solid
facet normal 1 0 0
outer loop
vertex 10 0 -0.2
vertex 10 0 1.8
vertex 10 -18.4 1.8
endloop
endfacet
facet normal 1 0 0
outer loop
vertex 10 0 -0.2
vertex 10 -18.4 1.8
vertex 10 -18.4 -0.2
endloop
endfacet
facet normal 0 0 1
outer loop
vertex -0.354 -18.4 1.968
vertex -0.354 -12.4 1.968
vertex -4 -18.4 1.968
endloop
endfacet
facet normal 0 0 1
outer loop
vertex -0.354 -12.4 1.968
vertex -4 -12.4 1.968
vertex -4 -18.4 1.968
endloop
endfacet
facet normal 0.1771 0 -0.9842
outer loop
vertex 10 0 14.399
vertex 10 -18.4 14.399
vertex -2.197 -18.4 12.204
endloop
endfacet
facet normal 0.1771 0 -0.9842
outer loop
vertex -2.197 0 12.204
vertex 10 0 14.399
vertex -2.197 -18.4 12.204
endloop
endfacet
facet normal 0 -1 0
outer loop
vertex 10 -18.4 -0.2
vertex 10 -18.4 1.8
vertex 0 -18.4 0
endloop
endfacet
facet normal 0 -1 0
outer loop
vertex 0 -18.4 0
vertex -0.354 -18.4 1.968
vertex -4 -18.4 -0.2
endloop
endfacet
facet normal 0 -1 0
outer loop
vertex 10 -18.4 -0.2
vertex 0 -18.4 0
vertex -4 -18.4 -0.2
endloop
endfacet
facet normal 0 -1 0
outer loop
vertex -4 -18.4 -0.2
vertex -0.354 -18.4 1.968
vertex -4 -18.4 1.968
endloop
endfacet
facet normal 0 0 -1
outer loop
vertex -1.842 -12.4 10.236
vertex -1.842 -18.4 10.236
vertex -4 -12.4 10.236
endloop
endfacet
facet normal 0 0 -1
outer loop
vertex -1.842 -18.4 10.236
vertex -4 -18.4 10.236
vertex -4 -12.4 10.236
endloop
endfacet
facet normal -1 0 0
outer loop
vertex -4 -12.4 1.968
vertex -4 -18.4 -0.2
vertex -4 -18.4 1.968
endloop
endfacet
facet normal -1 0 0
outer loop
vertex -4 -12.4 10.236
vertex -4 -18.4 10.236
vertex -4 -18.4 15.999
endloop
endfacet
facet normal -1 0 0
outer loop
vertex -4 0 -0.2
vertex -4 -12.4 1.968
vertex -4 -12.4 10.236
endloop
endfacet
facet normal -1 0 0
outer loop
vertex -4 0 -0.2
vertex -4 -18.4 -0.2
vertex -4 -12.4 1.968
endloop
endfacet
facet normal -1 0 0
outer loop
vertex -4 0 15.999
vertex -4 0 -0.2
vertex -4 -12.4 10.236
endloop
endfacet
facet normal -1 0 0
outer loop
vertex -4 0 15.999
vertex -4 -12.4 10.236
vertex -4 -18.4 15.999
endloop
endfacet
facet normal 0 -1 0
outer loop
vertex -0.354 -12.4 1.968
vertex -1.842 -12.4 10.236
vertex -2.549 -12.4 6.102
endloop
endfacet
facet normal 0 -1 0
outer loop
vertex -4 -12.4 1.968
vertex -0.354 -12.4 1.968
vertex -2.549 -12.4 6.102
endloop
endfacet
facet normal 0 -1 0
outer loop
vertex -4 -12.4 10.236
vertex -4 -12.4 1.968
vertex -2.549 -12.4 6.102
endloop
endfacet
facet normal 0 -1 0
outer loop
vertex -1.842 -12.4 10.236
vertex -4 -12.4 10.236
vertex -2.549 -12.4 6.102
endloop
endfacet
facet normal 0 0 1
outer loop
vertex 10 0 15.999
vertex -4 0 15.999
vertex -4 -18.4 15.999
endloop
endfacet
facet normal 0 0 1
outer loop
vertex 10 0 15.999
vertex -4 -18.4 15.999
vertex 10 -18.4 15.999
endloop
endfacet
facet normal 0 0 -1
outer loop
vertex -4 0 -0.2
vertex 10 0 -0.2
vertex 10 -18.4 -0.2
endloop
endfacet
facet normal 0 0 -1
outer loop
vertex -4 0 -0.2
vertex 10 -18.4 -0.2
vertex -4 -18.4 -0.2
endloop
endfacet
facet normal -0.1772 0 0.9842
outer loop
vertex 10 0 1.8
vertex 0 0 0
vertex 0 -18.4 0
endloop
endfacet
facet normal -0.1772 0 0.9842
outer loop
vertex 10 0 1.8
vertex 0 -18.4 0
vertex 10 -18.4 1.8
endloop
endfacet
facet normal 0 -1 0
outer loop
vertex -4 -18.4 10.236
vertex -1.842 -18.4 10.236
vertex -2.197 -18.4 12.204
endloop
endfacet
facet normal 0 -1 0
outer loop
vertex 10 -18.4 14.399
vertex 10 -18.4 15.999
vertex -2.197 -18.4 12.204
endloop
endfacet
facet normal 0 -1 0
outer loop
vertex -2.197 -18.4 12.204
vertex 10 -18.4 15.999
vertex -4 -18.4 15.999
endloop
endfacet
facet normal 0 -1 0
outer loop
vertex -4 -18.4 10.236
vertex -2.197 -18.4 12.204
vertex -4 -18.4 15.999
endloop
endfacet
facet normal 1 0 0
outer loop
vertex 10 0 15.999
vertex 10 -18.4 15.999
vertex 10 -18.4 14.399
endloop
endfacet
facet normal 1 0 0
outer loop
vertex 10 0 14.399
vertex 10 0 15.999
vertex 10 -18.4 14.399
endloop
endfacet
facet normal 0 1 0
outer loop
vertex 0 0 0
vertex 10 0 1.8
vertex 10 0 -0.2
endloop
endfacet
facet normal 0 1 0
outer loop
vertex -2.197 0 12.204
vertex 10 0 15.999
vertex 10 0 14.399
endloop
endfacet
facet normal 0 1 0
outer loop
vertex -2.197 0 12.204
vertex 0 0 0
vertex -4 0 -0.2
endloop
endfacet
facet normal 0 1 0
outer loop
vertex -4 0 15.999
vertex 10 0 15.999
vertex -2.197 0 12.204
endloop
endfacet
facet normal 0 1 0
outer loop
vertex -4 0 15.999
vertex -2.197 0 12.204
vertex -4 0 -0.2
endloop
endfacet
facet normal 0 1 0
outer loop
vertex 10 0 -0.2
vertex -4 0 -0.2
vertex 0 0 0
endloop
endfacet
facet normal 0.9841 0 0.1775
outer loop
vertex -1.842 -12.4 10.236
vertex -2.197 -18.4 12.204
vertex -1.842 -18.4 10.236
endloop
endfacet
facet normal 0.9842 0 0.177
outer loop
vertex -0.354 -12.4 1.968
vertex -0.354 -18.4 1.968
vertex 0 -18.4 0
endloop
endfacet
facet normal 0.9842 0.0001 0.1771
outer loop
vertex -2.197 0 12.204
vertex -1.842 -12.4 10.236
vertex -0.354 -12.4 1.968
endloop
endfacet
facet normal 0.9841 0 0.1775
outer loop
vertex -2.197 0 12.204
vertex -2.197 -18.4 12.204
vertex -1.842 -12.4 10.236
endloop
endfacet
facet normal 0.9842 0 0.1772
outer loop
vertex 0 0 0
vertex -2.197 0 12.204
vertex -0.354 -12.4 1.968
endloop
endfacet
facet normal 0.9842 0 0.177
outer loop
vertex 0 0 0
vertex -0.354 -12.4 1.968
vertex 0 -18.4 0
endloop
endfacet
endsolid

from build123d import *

# Parameters (mm, degrees)
BASE_DEPTH = 18.4


with BuildPart() as part:
    # Croquis17 → BASE (new body)
    with BuildSketch(Plane(origin=(0, 0, 0), x_dir=(-1, 0, 0), z_dir=(0, 1, 0))):
        Polygon((0, 0), (-10, 1.8), (-10, -0.2), (4, -0.2), (4, 15.99927871), (-10, 15.99927871), (-10, 14.39927871), (2.196697179, 12.203873217), align=None)
    extrude(amount=-BASE_DEPTH)

    # Croquis19 → WIRE_WINDOW section 0
    with BuildSketch(Plane(origin=(0, 0, 0), x_dir=(0, 1, 0), z_dir=(0.9841833239736953, 0, 0.17715299831526504))):
        with BuildLine():
            Line((-18.4, 10.4), (-12.4, 10.4))
            Line((-12.4, 10.4), (-12.4, 2))
            Line((-12.4, 2), (-18.4, 2))
            Line((-18.4, 2), (-18.4, 10.4))
        make_face()
    # Croquis20 → WIRE_WINDOW section 1
    with BuildSketch(Plane(origin=(-4, 0, 0), x_dir=(0, -1, 0), z_dir=(-1, 0, 0))):
        with BuildLine():
            Line((18.4, 1.968366648), (12.4, 1.968366648))
            Line((12.4, 1.968366648), (12.4, 10.235506569))
            Line((12.4, 10.235506569), (18.4, 10.235506569))
            Line((18.4, 10.235506569), (18.4, 1.968366648))
        make_face()
    loft(mode=Mode.SUBTRACT)


solid = part.part
